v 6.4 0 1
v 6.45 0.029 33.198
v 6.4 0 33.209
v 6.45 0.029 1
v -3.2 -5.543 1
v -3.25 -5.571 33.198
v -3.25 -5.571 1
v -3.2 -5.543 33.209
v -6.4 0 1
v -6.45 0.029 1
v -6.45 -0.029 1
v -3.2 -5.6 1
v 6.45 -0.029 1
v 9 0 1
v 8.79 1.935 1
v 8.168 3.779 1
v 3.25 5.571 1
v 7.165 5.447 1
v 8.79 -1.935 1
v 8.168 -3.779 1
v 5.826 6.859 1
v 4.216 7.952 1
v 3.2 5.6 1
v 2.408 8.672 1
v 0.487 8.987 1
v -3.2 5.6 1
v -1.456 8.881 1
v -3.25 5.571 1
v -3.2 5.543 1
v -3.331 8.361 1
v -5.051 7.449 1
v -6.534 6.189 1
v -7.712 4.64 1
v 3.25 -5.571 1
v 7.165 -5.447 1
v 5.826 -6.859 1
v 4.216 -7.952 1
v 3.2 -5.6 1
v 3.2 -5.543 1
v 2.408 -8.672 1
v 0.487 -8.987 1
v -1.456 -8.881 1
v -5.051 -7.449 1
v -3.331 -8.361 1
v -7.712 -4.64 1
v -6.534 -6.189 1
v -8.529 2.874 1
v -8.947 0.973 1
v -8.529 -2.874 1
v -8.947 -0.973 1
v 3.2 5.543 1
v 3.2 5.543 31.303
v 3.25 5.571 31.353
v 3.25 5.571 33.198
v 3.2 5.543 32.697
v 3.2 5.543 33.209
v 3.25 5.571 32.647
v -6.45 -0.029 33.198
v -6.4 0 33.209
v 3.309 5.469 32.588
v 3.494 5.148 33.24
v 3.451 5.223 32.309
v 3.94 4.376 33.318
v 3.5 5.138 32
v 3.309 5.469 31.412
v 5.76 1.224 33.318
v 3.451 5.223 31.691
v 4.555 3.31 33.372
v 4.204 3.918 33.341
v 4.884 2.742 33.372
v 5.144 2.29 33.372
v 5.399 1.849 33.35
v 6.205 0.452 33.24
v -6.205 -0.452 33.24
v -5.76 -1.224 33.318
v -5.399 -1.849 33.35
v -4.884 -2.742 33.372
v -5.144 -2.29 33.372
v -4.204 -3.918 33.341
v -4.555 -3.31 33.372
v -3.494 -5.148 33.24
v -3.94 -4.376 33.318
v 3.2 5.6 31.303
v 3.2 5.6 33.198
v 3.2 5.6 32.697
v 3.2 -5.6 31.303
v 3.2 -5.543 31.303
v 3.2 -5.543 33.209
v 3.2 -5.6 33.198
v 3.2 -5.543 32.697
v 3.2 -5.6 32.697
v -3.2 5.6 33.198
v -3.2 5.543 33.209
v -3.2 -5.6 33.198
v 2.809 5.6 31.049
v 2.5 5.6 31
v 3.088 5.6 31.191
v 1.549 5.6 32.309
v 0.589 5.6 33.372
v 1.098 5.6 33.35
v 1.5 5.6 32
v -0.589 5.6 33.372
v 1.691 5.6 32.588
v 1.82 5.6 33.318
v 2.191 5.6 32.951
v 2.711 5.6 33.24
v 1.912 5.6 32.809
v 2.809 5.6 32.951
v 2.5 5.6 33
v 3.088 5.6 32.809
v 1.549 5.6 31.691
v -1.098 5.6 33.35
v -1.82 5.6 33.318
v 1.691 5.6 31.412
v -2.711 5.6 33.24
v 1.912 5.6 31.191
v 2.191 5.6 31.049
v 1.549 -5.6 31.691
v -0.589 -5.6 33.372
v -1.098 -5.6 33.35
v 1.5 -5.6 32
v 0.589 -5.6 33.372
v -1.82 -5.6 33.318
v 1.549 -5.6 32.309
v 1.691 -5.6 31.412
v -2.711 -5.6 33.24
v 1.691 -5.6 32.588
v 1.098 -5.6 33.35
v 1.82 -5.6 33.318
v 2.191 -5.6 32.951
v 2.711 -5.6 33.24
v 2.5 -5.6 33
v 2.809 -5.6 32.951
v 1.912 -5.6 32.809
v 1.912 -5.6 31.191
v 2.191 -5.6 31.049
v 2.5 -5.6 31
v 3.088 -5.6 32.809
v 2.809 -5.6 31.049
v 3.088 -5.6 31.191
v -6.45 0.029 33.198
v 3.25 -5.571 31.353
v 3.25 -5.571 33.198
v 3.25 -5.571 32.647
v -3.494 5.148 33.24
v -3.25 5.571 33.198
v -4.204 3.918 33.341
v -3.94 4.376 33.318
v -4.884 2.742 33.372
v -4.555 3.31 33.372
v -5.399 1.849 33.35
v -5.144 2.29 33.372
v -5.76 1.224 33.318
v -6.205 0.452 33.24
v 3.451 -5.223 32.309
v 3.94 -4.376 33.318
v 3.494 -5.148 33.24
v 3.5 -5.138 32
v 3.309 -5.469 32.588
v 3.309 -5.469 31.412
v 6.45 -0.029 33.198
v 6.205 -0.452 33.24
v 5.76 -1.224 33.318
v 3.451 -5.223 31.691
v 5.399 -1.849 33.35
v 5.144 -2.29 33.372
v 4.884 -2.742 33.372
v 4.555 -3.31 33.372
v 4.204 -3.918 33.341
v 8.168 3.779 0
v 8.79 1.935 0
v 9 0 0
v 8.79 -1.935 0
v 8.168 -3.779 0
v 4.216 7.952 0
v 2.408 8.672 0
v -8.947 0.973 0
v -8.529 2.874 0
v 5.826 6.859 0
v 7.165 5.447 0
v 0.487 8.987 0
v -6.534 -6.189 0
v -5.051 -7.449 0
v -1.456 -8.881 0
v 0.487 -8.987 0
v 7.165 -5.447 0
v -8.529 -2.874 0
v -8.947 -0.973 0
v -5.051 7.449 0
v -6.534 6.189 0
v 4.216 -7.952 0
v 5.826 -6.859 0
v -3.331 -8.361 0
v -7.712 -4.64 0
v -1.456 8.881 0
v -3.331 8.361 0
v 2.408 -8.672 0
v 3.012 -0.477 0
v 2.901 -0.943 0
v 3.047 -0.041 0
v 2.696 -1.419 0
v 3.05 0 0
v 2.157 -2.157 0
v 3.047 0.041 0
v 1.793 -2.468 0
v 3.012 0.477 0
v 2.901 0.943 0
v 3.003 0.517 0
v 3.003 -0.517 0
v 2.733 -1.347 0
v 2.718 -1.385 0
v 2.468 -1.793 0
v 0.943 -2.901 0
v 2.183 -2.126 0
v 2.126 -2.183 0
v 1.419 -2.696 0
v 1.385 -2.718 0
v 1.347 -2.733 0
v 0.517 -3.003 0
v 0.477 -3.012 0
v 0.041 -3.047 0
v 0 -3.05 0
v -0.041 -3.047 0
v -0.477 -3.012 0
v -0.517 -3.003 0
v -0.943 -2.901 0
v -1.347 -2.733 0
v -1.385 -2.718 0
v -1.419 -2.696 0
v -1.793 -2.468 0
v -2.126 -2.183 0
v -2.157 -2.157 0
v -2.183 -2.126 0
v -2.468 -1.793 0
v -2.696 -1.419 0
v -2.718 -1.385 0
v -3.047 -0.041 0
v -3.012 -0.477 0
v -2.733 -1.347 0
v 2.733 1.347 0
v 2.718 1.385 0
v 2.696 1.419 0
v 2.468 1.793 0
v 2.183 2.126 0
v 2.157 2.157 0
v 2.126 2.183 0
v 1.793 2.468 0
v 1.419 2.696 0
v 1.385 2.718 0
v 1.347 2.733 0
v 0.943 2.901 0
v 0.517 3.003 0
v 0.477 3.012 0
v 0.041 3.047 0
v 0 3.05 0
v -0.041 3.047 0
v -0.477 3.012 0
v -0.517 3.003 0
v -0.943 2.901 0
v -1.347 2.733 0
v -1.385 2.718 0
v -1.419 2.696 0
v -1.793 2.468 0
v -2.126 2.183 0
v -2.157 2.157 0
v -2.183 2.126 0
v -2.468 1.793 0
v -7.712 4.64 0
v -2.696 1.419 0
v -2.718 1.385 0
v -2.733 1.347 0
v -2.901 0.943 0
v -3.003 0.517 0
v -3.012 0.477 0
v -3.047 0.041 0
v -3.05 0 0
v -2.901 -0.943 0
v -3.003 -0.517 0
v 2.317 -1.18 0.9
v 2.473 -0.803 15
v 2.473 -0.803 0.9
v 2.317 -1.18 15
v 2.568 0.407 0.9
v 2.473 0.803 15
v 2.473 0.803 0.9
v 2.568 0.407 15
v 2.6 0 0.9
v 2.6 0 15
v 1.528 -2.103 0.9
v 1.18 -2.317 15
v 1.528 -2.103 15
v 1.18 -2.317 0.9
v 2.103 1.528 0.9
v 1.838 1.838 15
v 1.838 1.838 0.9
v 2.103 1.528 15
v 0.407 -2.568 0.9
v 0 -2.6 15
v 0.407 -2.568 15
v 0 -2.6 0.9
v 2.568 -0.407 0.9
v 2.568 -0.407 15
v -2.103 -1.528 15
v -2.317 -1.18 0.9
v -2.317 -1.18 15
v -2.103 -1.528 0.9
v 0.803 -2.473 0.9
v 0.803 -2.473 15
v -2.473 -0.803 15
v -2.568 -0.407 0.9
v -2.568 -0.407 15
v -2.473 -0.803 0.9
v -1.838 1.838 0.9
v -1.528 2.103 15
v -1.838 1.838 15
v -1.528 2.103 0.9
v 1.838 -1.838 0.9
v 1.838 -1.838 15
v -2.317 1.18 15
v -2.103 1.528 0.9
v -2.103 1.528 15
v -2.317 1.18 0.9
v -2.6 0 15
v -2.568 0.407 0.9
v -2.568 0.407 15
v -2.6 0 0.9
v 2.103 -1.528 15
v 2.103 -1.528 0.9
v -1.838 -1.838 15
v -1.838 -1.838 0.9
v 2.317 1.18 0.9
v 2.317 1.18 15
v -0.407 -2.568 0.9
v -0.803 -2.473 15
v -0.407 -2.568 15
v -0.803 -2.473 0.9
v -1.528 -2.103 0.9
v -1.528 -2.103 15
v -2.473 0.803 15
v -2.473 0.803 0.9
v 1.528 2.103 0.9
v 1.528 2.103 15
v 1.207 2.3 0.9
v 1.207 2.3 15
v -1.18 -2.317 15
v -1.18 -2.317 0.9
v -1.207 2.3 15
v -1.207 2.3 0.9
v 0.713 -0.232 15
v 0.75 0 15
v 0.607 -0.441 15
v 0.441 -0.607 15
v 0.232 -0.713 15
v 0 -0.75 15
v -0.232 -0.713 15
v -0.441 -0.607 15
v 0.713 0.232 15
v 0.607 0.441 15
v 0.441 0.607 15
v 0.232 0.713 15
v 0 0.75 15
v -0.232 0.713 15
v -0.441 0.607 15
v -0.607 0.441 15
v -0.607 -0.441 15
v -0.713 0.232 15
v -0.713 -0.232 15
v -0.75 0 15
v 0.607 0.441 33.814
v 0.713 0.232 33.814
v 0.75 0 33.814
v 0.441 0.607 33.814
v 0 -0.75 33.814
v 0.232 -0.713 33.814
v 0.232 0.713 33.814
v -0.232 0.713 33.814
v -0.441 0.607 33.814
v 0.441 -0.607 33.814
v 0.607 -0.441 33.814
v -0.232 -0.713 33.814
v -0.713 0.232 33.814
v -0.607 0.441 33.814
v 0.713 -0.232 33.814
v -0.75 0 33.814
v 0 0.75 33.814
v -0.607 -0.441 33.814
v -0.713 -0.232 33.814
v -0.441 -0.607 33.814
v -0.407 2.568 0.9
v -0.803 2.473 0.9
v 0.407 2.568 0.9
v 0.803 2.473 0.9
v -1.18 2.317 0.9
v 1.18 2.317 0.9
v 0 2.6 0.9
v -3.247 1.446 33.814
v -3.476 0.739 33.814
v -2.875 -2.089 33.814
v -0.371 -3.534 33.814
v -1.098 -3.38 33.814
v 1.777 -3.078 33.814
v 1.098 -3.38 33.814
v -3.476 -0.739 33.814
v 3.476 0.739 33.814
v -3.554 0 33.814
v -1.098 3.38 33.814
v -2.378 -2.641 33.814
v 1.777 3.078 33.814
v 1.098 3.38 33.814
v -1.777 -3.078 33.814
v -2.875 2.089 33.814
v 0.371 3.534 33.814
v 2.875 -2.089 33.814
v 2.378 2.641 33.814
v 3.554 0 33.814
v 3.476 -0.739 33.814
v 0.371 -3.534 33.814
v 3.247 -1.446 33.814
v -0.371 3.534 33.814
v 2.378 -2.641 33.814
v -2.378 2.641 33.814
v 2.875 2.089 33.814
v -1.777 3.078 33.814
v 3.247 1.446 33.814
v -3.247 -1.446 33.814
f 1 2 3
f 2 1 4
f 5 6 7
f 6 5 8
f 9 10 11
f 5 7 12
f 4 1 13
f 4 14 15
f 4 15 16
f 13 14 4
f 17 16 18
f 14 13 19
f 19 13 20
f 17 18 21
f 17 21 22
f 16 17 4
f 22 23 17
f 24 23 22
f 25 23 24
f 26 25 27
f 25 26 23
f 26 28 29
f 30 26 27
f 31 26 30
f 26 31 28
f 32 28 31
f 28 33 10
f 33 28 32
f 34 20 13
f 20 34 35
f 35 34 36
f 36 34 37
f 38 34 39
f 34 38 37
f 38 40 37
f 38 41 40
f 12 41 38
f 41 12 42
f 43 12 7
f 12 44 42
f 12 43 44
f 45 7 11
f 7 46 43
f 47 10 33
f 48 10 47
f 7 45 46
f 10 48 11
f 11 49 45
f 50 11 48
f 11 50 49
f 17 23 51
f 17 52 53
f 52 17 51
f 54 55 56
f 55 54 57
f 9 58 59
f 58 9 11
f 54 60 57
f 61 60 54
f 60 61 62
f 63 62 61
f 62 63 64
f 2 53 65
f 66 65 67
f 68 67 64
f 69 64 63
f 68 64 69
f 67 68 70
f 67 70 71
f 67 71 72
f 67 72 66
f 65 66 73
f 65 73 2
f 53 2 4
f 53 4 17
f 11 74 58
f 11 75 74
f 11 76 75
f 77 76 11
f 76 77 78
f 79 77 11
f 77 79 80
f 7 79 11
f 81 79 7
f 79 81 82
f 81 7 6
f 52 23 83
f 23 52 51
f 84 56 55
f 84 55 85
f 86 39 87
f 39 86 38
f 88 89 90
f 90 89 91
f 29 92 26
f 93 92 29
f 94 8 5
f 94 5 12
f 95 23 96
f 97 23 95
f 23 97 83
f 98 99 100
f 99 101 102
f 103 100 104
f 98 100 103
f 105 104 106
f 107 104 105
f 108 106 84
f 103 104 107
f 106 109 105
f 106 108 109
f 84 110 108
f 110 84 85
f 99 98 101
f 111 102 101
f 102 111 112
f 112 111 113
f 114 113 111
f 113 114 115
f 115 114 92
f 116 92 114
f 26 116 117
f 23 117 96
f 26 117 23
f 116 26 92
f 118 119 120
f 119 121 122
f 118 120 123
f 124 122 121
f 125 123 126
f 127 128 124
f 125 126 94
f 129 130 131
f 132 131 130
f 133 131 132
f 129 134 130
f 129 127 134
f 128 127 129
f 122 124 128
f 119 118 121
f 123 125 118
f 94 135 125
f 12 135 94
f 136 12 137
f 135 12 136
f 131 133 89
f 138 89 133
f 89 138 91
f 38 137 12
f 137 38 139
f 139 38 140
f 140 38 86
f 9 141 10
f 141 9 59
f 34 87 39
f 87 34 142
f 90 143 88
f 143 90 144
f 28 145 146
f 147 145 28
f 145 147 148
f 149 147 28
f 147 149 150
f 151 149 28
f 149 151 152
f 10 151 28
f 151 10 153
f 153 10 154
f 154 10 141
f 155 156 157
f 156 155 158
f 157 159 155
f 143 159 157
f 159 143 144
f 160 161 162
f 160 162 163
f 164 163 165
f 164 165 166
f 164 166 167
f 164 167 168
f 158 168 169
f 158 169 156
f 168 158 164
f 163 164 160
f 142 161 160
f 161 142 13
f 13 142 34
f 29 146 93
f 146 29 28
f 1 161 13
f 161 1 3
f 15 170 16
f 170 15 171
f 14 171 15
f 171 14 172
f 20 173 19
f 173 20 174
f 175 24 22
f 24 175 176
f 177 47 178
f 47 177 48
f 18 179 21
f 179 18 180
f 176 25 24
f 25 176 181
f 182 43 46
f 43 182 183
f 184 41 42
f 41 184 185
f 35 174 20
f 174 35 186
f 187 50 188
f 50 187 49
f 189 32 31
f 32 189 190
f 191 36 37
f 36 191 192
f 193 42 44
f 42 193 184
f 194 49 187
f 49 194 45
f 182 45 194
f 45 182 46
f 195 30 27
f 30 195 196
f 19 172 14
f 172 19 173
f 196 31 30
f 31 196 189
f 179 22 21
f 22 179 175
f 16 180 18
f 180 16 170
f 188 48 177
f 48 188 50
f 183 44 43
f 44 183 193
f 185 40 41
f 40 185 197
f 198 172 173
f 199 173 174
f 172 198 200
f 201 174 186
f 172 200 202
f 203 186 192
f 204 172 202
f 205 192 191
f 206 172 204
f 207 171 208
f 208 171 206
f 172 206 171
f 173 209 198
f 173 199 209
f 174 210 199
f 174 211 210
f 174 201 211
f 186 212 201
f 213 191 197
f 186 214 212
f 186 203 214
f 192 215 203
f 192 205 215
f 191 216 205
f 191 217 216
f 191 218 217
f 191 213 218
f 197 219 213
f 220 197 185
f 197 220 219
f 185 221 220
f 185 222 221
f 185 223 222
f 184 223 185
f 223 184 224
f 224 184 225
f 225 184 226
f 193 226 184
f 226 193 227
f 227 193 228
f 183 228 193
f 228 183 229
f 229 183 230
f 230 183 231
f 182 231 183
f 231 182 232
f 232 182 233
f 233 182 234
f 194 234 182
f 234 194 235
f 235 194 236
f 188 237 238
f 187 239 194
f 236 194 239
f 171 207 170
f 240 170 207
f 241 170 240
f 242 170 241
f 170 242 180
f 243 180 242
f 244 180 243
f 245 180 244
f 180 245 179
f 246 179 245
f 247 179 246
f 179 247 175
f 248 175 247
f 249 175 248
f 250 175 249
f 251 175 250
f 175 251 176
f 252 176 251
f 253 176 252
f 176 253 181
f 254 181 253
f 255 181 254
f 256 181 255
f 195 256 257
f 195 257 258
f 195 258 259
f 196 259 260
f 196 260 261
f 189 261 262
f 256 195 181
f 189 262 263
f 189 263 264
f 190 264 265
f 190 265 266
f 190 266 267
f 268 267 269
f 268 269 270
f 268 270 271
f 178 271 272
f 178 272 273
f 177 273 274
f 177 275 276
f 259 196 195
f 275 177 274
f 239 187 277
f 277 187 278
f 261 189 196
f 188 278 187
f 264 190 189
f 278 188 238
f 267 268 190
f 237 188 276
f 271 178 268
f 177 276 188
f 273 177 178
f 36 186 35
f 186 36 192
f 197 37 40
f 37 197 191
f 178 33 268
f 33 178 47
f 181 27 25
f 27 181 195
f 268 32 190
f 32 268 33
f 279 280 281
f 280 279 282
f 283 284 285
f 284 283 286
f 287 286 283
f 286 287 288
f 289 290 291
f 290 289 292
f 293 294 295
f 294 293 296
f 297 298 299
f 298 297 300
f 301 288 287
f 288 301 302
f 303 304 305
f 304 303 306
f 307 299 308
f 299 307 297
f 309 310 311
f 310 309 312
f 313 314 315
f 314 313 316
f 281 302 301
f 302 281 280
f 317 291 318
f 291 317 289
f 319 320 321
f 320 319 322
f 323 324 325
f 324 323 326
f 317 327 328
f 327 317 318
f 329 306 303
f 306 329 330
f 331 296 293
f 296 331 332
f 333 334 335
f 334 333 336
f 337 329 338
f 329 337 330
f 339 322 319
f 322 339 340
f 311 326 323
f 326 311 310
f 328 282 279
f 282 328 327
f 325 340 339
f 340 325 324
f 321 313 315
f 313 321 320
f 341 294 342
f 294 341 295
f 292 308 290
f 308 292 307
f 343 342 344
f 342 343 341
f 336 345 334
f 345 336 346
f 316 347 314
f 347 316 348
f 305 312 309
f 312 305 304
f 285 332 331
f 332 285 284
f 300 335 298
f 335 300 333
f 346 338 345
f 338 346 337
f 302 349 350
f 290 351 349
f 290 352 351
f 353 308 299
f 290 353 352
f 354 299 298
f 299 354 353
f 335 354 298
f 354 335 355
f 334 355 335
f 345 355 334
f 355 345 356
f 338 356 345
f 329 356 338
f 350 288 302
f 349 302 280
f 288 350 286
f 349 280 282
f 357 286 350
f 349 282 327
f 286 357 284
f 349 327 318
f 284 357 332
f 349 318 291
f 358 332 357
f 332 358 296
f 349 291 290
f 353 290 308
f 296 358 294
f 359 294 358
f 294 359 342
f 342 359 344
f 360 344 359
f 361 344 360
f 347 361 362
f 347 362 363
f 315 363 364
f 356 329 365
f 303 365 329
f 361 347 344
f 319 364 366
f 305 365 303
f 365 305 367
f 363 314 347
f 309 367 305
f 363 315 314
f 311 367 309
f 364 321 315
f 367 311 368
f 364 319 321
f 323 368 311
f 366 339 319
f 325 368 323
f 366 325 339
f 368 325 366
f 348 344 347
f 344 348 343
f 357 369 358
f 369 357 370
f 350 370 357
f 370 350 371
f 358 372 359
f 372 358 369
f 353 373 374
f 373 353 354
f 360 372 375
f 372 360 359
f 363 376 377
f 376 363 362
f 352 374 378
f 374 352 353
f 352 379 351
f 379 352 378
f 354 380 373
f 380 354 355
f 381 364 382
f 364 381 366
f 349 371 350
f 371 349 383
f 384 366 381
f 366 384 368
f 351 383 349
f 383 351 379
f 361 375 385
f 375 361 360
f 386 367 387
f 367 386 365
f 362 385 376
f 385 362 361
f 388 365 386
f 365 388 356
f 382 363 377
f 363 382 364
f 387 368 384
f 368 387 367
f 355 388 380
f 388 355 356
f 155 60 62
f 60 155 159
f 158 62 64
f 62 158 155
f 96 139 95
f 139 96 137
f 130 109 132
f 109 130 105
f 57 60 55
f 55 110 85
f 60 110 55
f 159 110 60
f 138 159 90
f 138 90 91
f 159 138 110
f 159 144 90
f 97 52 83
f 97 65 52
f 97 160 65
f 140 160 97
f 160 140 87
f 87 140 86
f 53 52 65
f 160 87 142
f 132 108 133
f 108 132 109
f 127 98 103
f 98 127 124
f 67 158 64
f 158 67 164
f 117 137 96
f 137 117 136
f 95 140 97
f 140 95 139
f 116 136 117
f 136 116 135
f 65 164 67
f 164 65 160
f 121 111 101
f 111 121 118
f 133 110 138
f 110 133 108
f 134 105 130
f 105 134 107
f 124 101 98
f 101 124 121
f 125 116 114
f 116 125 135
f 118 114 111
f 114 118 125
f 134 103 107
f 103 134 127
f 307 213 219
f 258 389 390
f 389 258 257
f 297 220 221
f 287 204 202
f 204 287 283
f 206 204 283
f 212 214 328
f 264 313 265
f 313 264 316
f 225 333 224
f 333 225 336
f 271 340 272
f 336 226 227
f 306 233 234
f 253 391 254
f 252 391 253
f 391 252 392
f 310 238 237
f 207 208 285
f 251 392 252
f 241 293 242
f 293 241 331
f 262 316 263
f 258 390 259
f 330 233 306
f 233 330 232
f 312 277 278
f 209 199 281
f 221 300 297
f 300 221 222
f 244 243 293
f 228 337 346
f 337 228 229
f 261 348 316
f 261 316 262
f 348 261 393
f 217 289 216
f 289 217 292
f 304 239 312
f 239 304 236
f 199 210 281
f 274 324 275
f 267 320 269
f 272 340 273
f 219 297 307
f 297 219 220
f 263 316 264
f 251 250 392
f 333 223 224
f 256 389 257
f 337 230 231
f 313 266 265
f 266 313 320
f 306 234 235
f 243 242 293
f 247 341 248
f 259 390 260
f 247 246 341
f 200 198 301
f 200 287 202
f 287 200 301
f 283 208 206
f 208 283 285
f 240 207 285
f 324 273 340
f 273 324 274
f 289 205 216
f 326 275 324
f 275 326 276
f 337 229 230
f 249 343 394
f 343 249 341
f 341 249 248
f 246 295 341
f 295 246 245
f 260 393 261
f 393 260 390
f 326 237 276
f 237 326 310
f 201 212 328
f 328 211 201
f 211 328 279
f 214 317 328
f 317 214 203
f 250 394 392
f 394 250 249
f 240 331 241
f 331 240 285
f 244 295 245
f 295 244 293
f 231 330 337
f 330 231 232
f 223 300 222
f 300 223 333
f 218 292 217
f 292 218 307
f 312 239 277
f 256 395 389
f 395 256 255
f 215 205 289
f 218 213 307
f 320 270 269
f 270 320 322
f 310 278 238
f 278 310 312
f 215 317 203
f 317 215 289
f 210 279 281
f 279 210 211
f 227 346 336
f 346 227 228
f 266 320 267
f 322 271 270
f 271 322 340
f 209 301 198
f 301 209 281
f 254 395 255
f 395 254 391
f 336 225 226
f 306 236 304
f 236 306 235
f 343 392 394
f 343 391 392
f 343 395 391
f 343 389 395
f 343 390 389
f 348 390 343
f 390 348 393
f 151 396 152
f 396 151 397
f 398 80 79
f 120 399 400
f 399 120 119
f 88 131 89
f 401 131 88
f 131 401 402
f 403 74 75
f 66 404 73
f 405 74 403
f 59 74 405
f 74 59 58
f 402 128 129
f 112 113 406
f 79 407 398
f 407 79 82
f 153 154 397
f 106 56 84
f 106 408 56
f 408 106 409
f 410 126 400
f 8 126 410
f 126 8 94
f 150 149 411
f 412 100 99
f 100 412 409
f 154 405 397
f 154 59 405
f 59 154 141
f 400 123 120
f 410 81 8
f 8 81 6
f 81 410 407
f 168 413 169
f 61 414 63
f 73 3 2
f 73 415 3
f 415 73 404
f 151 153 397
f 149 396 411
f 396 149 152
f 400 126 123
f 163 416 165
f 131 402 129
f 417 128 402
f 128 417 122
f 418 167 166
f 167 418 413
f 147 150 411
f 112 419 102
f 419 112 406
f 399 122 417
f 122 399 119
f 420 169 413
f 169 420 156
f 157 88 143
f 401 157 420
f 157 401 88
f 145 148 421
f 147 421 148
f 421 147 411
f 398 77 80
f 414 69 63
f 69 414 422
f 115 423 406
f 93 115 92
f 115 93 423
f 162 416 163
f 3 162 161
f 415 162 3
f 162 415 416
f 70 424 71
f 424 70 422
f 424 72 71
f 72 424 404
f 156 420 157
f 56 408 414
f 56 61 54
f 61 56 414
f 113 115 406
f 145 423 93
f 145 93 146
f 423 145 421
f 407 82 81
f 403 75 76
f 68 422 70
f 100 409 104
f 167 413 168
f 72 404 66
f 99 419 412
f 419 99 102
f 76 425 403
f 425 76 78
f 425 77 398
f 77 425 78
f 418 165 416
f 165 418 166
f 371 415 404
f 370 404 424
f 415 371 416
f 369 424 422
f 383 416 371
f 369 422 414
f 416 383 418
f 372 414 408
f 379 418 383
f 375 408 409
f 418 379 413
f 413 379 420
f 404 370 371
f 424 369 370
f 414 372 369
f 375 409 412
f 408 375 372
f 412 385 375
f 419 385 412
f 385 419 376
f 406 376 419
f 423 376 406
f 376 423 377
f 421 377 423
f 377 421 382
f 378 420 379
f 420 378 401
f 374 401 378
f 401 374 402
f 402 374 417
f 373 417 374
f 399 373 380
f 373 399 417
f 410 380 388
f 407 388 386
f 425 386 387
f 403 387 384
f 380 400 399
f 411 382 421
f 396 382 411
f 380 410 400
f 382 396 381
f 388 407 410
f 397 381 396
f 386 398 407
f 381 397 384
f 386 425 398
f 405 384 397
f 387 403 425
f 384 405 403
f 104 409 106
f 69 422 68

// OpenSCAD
// file: lib/omniWheelConnector.scad
// ----------------------------------------------------------------------
// Omniwheel connector.
// ----------------------------------------------------------------------

module omniWheelConnector() {
    omniWheelMotorShaftRadius = 2.6;
    omniWheelSlotWidth = 4;
    omniWheelSlotThickness = 2;
    omniWheelSlotIndent = 0.3;
    omniWheelMotorShaftDepth = 15;

    boltHeight = 11;
    boltConeHeight = 1;
    boltWidth = 11.2;
    shaftWidth = 6.3;
    collarWidth = 18;
    collarHeight = 1;

    slotWidth = 4;
    slotIndent = 0.5;              // Was 0.6

    shaftHeight = boltHeight + collarHeight;

    exhaustHoleWidth = 1.5;
    longLength = 100;
    shaftLength = 30;
    capHeight = shaftLength - boltHeight;

    capExtraHeight = 3;
    wireHoleWidth = 2;

    module hexagon(size, height) {
        boxWidth = size/1.75;
        for (r = [-60, 0, 60]) {
            rotate([0, 0, r]) {
                translate([0, 0, height/2]) {
                    cube([boxWidth, size, height], true);
                }
            }
        }
    }
    intersection() {
        difference() {
            union() {
                difference() {
                    union() {
                        cylinder(r = collarWidth/2, h = collarHeight);
                        translate([0, 0, 1]) {
                            hexagon(boltWidth, boltHeight+capHeight+capExtraHeight);
                        }
                    }
                    union() {
                        difference() {
                            cylinder(r=omniWheelMotorShaftRadius,
                                h=omniWheelMotorShaftDepth, $fn=40);
                            translate([-omniWheelSlotWidth/2,
                                    omniWheelMotorShaftRadius - omniWheelSlotIndent,
                                    0]) {
                                cube([omniWheelSlotWidth, omniWheelSlotThickness,
                                        omniWheelMotorShaftDepth+2*iota]);
                            }
                        }
                        cylinder(r = exhaustHoleWidth/2, h = longLength, $fn=20);
                        translate([2.5, longLength/2,
                                collarHeight+boltHeight+
                                capHeight+wireHoleWidth/2]) {
                            rotate([90, 0, 0]) {
                                cylinder(r = wireHoleWidth/2,
                                    h = longLength, $fn=20);
                            }
                        }
                    }
                }
                translate([-slotWidth/2, shaftWidth/2 - slotIndent, 0]) {
                    cube([slotWidth, 1, shaftHeight]);
                }
            }
            translate([0, 0, -iota]) {
                cylinder(r1 = omniWheelMotorShaftRadius+0.5, r2 = omniWheelMotorShaftRadius,
                    h = boltConeHeight, $fn=40);
            }
        }
        sphere(collarHeight + boltHeight + capHeight + capExtraHeight);
    }
}
// file: lib/stepper.scad
smWidth = 42;
smLength = 40;
smScrewHoleOffsets = 31/2;
smCenterDiameter = 22;
smExtra = 1;

module stepperMotor() {
    smCenterHeight = 2;
    smShaftDiameter = 5;
    smShaftLength = 23;
    smScrewDepth = 4.5;
    smScrewDiameter = 3;
    smEdgeTrimOffset = 27;
    module add() {
        translate([-smWidth/2, -smLength, -smWidth/2]) {
            cube([smWidth, smLength, smWidth]);
        }
        rotate([-90, 0, 0]) {
            cylinder(d=smCenterDiameter, h=smCenterHeight, $fn=30);
            cylinder(d=smShaftDiameter, h=smShaftLength, $fn=20);
        }
    }
    module del() {
        for (x = [smScrewHoleOffsets, -smScrewHoleOffsets]) {
            for (z = [smScrewHoleOffsets, -smScrewHoleOffsets]) {
                translate([x, iota, z]) {
                    rotate([90, 0, 0]) {
                        cylinder(d=smScrewDiameter, h=smScrewDepth, $fn=40);
                    }
                }
            }
        }
        for (a = [45, 135, 225, 315]) {
            rotate([0, a, 0]) {
                translate([smEdgeTrimOffset,
                        -smLength-iota, -smWidth/2-iota]) {
                    cube([smWidth, smLength+2*iota, smWidth+2*iota]);
                }
            }
        }

    }
    difference() {
        add();
        del();
    }
}

module stepperMotorHole() {
    smHoleHeight = 20;
    smScrewHoleDiameter = 4;

    widthPlusExtra = smWidth + smExtra;
    lengthPlusExtra = smLength + smExtra/2;

    translate([-smWidth/2, -lengthPlusExtra, -widthPlusExtra/2]) {
        cube([smWidth, lengthPlusExtra, widthPlusExtra]);
    }
    translate([0, -iota, 0]) {
        rotate([-90, 0, 0]) {
            cylinder(d=smCenterDiameter+smExtra, h=smHoleHeight, $fn=40);
        }
    }
    for (x = [smScrewHoleOffsets, -smScrewHoleOffsets]) {
        for (z = [smScrewHoleOffsets, -smScrewHoleOffsets]) {
            translate([x, smHoleHeight-iota, z]) {
                rotate([90, 0, 0]) {
                    cylinder(d=smScrewHoleDiameter, h=smHoleHeight, $fn=40);
                }
            }
        }
    }

}
// file: lib/commonConstants.scad
// A small quantity to keep parts from starting or ending at exactly the
// same location. For example when we create a hole through an object we
// want the object being subtracted to stick slightly past the object being
// subtracted from.
iota = 0.1;


// Length and hole diameter of the #4 x 3/8in Phillips mount screw.
screwLength = 9.3;
screwHoleDiameter = 2.75;
screwHeadDiameter = 6.5;
screwBodyDiameter = 3.4;


// These constants are the basic parameters of the mount plate. They are
// necessary for other components to make their calculations.
mountPlateWidth = 37.6;
mountPlateLength = 51;


// These constants are the basis for the carbon fiber mount points. They are
// necessary for other components to make their calculations.
mountRodDiameter = 5.5;         // A little extra because holes are smaller.
mountThickness = 9;
mountDiameter = mountRodDiameter + 2*mountThickness;


// These constasnts are teh basis for the motor base. They are necessary for
// other components to make their calculations.
motorBaseExtraAxisOffset = 5;
motorBaseTopOffset = sqrt(3)*mountPlateWidth/6 + motorBaseExtraAxisOffset;
motorBaseBottomOffset = mountPlateLength/sqrt(2) + motorBaseTopOffset;
motorBaseBottomRadius = sqrt(pow(motorBaseBottomOffset,2) +
                             pow(mountPlateWidth/2, 2));
mountBaseRodOffsets = motorBaseBottomRadius-mountDiameter/2;
// main file
include <lib/commonConstants.scad>
include <lib/stepper.scad>
include <lib/omniWheelConnector.scad>

omniWheelConnector();
